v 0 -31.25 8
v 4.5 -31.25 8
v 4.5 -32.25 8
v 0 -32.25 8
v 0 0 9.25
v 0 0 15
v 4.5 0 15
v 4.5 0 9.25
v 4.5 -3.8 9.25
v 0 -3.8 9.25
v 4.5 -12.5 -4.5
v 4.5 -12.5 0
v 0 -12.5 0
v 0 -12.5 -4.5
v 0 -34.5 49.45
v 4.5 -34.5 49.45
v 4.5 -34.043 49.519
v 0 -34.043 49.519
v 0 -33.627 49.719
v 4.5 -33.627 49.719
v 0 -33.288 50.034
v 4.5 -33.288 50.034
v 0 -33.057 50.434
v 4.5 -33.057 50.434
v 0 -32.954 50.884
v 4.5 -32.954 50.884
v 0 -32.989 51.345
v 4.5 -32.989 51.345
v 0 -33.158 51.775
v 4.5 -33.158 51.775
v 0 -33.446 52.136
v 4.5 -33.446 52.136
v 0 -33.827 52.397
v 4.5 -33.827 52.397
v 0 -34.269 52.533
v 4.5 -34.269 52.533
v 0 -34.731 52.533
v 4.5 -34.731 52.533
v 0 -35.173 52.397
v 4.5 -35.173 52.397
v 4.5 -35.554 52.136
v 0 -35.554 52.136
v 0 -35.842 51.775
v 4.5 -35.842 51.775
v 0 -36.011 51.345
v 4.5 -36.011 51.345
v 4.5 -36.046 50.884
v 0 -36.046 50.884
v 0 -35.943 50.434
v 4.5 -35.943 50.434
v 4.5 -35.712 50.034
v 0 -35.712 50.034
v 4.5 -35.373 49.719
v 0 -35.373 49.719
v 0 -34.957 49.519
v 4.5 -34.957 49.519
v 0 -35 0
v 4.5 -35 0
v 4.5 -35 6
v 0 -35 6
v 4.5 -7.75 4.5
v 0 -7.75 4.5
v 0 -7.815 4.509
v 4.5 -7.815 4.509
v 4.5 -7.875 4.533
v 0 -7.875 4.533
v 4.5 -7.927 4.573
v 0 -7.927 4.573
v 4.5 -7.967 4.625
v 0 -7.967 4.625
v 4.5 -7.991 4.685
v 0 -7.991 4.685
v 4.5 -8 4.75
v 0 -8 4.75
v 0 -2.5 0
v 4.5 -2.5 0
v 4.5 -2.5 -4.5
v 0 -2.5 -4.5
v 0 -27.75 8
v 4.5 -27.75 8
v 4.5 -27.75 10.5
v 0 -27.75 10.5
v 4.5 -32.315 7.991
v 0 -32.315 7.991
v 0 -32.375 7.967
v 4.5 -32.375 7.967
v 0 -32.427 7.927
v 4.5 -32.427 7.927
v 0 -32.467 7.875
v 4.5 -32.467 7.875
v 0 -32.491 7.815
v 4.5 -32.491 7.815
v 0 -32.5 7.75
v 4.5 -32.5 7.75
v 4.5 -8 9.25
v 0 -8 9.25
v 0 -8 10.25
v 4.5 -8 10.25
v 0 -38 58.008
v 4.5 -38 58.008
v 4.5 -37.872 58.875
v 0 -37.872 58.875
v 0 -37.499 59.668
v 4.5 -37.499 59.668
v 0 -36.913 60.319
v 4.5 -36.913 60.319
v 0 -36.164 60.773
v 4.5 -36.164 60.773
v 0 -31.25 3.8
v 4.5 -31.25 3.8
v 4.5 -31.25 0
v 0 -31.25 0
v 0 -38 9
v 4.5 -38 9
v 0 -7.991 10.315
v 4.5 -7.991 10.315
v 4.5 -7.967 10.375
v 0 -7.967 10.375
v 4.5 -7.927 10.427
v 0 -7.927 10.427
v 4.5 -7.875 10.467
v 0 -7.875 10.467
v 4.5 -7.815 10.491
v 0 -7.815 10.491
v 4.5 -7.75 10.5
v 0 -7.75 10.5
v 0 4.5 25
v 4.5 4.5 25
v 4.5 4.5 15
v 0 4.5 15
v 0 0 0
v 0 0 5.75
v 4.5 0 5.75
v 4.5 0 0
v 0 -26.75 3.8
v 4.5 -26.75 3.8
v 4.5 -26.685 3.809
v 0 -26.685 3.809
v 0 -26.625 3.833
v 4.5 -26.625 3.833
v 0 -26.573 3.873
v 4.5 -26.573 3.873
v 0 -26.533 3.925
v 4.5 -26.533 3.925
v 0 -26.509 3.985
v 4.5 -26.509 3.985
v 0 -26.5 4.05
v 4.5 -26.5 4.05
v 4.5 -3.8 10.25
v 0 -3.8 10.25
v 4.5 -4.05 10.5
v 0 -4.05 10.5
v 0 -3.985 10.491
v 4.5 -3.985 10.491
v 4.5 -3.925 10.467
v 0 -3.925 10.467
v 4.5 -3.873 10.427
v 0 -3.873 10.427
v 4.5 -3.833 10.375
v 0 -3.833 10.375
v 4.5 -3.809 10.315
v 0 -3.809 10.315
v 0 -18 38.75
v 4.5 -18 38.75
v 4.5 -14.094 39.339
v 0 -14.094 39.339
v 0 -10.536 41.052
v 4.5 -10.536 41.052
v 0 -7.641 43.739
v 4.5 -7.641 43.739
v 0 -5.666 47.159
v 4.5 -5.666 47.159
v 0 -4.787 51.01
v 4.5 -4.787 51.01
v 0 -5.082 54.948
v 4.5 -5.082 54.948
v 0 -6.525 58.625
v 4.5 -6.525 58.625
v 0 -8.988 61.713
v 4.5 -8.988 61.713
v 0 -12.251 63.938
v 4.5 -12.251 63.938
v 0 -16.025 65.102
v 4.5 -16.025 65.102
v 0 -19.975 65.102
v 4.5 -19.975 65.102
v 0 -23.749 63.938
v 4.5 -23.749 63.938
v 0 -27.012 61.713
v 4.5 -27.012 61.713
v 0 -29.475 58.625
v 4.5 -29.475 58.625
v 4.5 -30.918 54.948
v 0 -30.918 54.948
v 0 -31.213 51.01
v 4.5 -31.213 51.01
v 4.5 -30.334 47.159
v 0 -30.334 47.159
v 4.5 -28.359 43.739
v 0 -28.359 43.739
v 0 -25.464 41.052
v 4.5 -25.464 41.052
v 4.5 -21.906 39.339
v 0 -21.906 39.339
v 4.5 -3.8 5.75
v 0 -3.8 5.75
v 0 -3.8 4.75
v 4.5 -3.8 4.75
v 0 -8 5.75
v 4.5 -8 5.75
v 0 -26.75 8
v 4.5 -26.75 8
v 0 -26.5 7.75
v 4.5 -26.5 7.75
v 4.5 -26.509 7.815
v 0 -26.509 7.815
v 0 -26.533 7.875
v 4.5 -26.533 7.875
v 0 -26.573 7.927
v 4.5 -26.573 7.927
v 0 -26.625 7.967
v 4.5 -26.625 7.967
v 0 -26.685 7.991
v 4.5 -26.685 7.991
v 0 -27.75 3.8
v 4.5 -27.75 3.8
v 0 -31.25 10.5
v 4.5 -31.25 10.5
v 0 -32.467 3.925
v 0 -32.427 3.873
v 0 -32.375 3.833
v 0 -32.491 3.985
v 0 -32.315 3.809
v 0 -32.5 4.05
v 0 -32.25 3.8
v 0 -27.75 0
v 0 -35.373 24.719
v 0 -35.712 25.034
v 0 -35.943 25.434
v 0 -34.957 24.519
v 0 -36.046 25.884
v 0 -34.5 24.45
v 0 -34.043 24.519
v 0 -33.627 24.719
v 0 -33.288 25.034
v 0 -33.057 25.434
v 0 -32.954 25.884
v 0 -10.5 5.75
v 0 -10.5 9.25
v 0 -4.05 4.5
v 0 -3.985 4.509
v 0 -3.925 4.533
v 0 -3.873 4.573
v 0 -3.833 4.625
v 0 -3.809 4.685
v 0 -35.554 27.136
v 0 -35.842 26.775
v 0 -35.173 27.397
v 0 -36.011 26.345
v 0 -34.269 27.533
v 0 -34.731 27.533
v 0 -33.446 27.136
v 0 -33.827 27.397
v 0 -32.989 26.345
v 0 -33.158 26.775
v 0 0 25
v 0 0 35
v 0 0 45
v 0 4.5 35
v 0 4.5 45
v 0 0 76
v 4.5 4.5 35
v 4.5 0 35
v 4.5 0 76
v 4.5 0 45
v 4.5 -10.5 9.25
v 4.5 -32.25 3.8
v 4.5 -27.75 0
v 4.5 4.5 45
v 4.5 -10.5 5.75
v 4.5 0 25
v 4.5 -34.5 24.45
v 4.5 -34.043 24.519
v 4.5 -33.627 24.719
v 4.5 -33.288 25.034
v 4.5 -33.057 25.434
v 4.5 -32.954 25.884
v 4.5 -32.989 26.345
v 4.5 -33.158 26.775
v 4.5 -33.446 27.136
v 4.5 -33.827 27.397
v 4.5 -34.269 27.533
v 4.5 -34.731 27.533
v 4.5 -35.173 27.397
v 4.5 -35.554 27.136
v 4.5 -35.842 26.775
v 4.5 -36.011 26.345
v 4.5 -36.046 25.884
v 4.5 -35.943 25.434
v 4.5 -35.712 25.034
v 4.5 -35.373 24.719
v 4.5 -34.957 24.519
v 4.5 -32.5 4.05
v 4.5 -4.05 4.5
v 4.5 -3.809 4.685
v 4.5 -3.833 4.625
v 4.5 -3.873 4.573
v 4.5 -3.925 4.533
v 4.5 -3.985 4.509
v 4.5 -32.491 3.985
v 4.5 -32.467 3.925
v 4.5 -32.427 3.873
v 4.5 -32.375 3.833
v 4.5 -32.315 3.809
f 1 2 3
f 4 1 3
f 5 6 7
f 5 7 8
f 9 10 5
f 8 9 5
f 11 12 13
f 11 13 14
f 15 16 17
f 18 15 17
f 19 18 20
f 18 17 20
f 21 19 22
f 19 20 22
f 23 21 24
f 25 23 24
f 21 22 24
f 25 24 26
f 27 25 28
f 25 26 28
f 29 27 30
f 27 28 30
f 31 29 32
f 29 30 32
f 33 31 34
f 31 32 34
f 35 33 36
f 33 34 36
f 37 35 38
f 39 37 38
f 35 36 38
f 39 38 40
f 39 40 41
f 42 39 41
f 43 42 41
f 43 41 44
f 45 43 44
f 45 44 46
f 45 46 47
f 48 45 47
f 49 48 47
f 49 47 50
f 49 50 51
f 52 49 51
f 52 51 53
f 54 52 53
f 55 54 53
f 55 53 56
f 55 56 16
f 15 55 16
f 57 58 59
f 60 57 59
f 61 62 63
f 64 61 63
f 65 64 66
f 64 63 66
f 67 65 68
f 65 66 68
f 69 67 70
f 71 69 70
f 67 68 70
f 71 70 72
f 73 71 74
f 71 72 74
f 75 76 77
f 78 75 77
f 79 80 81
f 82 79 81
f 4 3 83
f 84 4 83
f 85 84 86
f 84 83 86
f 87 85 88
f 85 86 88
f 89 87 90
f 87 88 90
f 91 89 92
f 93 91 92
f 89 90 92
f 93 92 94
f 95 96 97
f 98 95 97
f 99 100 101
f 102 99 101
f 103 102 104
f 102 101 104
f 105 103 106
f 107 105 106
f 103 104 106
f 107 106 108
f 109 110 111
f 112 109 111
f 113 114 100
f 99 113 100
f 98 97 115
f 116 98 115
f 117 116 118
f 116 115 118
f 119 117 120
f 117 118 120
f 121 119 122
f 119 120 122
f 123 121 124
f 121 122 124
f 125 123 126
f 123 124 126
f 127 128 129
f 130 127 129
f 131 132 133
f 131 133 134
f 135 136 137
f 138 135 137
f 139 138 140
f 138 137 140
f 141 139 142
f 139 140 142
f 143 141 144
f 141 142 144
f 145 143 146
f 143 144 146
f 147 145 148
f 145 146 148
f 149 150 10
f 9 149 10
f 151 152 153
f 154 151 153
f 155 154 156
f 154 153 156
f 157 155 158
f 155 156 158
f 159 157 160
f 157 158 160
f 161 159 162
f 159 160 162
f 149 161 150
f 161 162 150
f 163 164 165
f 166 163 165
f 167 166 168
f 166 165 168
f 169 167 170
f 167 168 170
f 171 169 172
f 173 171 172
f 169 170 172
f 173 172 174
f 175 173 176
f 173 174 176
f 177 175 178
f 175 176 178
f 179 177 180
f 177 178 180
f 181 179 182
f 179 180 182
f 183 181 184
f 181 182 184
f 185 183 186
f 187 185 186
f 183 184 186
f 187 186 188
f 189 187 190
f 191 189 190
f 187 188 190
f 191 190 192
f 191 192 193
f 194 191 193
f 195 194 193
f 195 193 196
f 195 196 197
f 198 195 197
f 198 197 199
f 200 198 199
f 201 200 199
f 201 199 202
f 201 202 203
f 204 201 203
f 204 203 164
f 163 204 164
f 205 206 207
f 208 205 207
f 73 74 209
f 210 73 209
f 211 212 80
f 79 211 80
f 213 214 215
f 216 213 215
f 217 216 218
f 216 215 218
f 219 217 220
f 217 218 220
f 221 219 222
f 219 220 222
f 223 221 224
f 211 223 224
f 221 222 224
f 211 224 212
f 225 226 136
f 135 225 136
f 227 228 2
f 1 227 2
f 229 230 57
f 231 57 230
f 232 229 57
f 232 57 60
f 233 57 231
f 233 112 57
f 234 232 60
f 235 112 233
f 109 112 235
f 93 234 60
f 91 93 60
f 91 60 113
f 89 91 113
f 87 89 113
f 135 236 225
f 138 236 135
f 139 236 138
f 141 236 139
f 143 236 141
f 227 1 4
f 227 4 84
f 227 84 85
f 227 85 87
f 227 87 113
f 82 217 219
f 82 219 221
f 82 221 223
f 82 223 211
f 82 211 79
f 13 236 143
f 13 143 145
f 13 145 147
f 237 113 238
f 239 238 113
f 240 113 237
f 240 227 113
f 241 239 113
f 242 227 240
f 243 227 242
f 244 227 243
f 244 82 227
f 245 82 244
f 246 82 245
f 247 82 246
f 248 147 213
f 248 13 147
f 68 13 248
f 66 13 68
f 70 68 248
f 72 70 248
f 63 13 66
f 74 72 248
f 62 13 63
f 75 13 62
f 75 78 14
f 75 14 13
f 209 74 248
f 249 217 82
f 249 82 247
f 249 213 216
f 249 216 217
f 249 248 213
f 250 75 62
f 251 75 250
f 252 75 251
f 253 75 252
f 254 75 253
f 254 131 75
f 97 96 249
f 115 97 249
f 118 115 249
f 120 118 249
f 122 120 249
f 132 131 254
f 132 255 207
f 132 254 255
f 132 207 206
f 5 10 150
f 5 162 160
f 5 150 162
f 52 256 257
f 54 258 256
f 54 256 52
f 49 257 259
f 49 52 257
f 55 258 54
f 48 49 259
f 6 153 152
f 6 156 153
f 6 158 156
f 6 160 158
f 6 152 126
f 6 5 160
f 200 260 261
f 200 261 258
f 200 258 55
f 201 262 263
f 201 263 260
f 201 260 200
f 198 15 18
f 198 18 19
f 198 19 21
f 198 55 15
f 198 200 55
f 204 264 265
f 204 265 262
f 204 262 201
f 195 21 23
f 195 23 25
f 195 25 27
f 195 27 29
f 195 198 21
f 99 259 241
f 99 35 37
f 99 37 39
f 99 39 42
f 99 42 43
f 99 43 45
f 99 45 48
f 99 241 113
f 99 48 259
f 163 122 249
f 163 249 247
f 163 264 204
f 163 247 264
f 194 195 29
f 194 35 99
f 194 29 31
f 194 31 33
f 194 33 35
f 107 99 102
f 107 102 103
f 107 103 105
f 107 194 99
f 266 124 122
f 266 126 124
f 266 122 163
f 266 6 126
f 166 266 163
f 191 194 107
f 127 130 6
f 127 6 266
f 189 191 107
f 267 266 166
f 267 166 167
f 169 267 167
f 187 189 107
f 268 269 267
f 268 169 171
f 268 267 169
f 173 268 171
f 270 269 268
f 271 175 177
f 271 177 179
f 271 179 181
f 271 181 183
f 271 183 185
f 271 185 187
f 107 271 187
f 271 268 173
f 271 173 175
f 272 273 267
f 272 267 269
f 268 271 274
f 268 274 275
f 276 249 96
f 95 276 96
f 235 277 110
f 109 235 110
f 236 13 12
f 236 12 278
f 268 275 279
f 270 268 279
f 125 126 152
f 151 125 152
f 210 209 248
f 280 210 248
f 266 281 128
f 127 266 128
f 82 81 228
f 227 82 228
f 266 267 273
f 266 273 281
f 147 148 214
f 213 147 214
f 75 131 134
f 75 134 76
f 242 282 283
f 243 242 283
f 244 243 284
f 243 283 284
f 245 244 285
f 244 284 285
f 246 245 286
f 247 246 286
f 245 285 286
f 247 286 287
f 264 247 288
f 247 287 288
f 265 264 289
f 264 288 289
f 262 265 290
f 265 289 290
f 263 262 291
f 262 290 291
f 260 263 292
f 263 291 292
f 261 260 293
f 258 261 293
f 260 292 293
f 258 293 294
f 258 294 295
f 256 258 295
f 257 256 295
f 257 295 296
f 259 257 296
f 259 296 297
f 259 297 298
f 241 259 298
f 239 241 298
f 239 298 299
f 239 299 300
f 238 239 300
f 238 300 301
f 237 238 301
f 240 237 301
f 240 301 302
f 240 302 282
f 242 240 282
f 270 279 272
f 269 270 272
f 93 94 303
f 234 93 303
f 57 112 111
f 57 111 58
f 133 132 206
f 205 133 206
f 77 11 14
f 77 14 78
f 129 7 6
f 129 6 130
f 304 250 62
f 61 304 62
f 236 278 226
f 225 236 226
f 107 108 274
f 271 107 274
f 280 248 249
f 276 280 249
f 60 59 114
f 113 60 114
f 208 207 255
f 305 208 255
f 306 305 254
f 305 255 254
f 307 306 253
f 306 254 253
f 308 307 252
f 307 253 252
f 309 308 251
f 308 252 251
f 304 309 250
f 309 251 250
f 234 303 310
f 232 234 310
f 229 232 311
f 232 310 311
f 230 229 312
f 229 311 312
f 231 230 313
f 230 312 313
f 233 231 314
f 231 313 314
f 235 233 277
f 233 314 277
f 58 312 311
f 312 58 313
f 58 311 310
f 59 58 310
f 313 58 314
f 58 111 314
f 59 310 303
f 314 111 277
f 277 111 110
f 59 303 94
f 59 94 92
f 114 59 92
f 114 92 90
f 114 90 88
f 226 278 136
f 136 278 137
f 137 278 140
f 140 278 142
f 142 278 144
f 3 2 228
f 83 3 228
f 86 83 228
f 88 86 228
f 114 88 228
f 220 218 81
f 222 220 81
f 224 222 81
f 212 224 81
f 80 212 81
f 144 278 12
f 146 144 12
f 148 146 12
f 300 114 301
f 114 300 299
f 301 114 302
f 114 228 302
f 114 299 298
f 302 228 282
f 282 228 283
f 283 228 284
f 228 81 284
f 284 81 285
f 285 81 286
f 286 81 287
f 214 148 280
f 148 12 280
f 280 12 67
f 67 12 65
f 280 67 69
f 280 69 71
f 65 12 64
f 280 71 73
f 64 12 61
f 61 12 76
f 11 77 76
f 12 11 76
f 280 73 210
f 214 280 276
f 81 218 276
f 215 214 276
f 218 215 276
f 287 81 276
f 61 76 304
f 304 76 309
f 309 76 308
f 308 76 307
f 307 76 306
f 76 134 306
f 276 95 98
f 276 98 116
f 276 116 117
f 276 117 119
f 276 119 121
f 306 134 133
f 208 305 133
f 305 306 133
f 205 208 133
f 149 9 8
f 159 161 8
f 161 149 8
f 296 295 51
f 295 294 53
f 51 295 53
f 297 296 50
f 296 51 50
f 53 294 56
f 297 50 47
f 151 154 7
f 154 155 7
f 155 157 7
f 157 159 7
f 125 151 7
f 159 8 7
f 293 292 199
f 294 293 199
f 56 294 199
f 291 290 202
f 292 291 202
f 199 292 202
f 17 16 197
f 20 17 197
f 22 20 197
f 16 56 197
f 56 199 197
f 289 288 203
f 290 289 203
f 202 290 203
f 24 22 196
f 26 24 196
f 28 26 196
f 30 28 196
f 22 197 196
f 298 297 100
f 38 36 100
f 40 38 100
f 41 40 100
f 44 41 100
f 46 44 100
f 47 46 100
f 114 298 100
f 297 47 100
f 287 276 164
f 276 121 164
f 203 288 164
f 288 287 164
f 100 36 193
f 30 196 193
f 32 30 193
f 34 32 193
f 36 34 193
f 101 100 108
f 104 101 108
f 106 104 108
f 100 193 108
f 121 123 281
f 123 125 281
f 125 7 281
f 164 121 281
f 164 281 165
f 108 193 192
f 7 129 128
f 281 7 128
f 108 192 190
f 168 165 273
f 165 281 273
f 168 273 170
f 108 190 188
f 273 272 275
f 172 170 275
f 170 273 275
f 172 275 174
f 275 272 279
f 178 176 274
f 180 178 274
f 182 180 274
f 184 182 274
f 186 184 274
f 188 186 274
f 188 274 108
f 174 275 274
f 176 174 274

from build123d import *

# Parameters (mm, degrees)
BOSS_EXTRUDE1_DEPTH  = 4.5
SKETCH2_W            = 9
SKETCH2_H            = 10
BOSS_EXTRUDE2_DEPTH  = 4.5
BOSS_EXTRUDE3_DEPTH  = 4.5
CUT_EXTRUDE1_DEPTH   = 84.792899461
SKETCH5_W            = 10
SKETCH5_H            = 4.5
BOSS_EXTRUDE4_DEPTH  = 4.5
CUT_EXTRUDE4_DEPTH   = 84.792899461
BOSS_EXTRUDE11_DEPTH = 4.5
SKETCH21_R           = 1.55
CUT_EXTRUDE8_DEPTH   = 86.089658596
SKETCH22_R           = 13.25
CUT_EXTRUDE9_DEPTH   = 86.089658596


with BuildPart() as part:
    # Sketch1 → Boss-Extrude1 (new body)
    with BuildSketch(Plane(origin=(0, 0, 0), x_dir=(0, 0, -1), z_dir=(1, 0, 0))):
        Polygon((0, 0), (0, -35), (-76, 0), align=None)
    extrude(amount=BOSS_EXTRUDE1_DEPTH)

    # Sketch2 → Boss-Extrude2 (add, through all)
    with BuildSketch(Plane(origin=(4.5, 0, 0), x_dir=(0, 0, -1), z_dir=(1, 0, 0))):
        with Locations((0, -7.5)):
            Rectangle(SKETCH2_W, SKETCH2_H)
    extrude(amount=-BOSS_EXTRUDE2_DEPTH)

    # Sketch3 → Boss-Extrude3 (add, through all)
    with BuildSketch(Plane(origin=(4.5, 0, 0), x_dir=(0, 0, -1), z_dir=(1, 0, 0))):
        Polygon((0, -35), (-40, -35), (-76, 0), (0, -25), align=None)
    extrude(amount=-BOSS_EXTRUDE3_DEPTH)

    # Sketch4 → Cut-Extrude1 (cut, through all)
    with BuildSketch(Plane(origin=(4.5, 0, 0), x_dir=(0, 0, -1), z_dir=(1, 0, 0))):
        with BuildLine():
            Line((0, -31.25), (0, -27.75))
            Line((0, -27.75), (-3.8, -27.75))
            Line((-3.8, -27.75), (-3.8, -26.75))
            ThreePointArc((-3.8, -26.75), (-3.873223305, -26.573223305), (-4.05, -26.5))
            Line((-4.05, -26.5), (-7.75, -26.5))
            ThreePointArc((-7.75, -26.5), (-7.926776695, -26.573223305), (-8, -26.75))
            Line((-8, -26.75), (-8, -27.75))
            Line((-8, -27.75), (-10.5, -27.75))
            Line((-10.5, -27.75), (-10.5, -31.25))
            Line((-10.5, -31.25), (-8, -31.25))
            Line((-8, -31.25), (-8, -32.25))
            ThreePointArc((-8, -32.25), (-7.926776695, -32.426776695), (-7.75, -32.5))
            Line((-7.75, -32.5), (-4.05, -32.5))
            ThreePointArc((-4.05, -32.5), (-3.873223305, -32.426776695), (-3.8, -32.25))
            Line((-3.8, -32.25), (-3.8, -31.25))
            Line((-3.8, -31.25), (0, -31.25))
        make_face()
    extrude(amount=-CUT_EXTRUDE1_DEPTH, mode=Mode.SUBTRACT)

    # Sketch5 → Boss-Extrude4 (add, through all)
    with BuildSketch(Plane(origin=(4.5, 0, 0), x_dir=(0, 0, -1), z_dir=(1, 0, 0))):
        with Locations((-20, 2.25)):
            Rectangle(SKETCH5_W, SKETCH5_H)
        with Locations((-40, 2.25)):
            Rectangle(SKETCH5_W, SKETCH5_H)
    extrude(amount=-BOSS_EXTRUDE4_DEPTH)

    # Sketch11 → Cut-Extrude4 (cut, through all)
    with BuildSketch(Plane.ZY):
        with BuildLine():
            Line((5.75, -10.5), (9.25, -10.5))
            Line((9.25, -10.5), (9.25, -8))
            Line((9.25, -8), (10.25, -8))
            ThreePointArc((10.25, -8), (10.426776695, -7.926776695), (10.5, -7.75))
            Line((10.5, -7.75), (10.5, -4.05))
            ThreePointArc((10.5, -4.05), (10.426776695, -3.873223305), (10.25, -3.8))
            Line((10.25, -3.8), (9.25, -3.8))
            Line((9.25, -3.8), (9.25, 0))
            Line((9.25, 0), (5.75, 0))
            Line((5.75, 0), (5.75, -3.8))
            Line((5.75, -3.8), (4.75, -3.8))
            ThreePointArc((4.75, -3.8), (4.573223305, -3.873223305), (4.5, -4.05))
            Line((4.5, -4.05), (4.5, -7.75))
            ThreePointArc((4.5, -7.75), (4.573223305, -7.926776695), (4.75, -8))
            Line((4.75, -8), (5.75, -8))
            Line((5.75, -8), (5.75, -10.5))
        make_face()
    extrude(amount=-CUT_EXTRUDE4_DEPTH, mode=Mode.SUBTRACT)

    # Sketch20 → Boss-Extrude11 (add, through all)
    with BuildSketch(Plane(origin=(4.5, 0, 0), x_dir=(0, 0, -1), z_dir=(1, 0, 0))):
        with BuildLine():
            Line((-9, -38), (-58.008074506, -38))
            ThreePointArc((-58.008074506, -38), (-59.667515225, -37.499251188), (-60.772980632, -36.164171))
            Line((-60.772980632, -36.164171), (-76, 0))
            Line((-76, 0), (-40, -35))
            Line((-40, -35), (-6, -35))
            Line((-6, -35), (-9, -38))
        make_face()
    extrude(amount=-BOSS_EXTRUDE11_DEPTH)

    # Sketch21 → Cut-Extrude8 (cut, through all)
    with BuildSketch(Plane(origin=(4.5, 0, 0), x_dir=(0, 0, -1), z_dir=(1, 0, 0))):
        with Locations((-51, -34.5)):
            Circle(SKETCH21_R)
        with Locations((-26, -34.5)):
            Circle(SKETCH21_R)
    extrude(amount=-CUT_EXTRUDE8_DEPTH, mode=Mode.SUBTRACT)

    # Sketch22 → Cut-Extrude9 (cut, through all)
    with BuildSketch(Plane(origin=(4.5, 0, 0), x_dir=(0, 0, -1), z_dir=(1, 0, 0))):
        with Locations((-52, -18)):
            Circle(SKETCH22_R)
    extrude(amount=-CUT_EXTRUDE9_DEPTH, mode=Mode.SUBTRACT)


solid = part.part
